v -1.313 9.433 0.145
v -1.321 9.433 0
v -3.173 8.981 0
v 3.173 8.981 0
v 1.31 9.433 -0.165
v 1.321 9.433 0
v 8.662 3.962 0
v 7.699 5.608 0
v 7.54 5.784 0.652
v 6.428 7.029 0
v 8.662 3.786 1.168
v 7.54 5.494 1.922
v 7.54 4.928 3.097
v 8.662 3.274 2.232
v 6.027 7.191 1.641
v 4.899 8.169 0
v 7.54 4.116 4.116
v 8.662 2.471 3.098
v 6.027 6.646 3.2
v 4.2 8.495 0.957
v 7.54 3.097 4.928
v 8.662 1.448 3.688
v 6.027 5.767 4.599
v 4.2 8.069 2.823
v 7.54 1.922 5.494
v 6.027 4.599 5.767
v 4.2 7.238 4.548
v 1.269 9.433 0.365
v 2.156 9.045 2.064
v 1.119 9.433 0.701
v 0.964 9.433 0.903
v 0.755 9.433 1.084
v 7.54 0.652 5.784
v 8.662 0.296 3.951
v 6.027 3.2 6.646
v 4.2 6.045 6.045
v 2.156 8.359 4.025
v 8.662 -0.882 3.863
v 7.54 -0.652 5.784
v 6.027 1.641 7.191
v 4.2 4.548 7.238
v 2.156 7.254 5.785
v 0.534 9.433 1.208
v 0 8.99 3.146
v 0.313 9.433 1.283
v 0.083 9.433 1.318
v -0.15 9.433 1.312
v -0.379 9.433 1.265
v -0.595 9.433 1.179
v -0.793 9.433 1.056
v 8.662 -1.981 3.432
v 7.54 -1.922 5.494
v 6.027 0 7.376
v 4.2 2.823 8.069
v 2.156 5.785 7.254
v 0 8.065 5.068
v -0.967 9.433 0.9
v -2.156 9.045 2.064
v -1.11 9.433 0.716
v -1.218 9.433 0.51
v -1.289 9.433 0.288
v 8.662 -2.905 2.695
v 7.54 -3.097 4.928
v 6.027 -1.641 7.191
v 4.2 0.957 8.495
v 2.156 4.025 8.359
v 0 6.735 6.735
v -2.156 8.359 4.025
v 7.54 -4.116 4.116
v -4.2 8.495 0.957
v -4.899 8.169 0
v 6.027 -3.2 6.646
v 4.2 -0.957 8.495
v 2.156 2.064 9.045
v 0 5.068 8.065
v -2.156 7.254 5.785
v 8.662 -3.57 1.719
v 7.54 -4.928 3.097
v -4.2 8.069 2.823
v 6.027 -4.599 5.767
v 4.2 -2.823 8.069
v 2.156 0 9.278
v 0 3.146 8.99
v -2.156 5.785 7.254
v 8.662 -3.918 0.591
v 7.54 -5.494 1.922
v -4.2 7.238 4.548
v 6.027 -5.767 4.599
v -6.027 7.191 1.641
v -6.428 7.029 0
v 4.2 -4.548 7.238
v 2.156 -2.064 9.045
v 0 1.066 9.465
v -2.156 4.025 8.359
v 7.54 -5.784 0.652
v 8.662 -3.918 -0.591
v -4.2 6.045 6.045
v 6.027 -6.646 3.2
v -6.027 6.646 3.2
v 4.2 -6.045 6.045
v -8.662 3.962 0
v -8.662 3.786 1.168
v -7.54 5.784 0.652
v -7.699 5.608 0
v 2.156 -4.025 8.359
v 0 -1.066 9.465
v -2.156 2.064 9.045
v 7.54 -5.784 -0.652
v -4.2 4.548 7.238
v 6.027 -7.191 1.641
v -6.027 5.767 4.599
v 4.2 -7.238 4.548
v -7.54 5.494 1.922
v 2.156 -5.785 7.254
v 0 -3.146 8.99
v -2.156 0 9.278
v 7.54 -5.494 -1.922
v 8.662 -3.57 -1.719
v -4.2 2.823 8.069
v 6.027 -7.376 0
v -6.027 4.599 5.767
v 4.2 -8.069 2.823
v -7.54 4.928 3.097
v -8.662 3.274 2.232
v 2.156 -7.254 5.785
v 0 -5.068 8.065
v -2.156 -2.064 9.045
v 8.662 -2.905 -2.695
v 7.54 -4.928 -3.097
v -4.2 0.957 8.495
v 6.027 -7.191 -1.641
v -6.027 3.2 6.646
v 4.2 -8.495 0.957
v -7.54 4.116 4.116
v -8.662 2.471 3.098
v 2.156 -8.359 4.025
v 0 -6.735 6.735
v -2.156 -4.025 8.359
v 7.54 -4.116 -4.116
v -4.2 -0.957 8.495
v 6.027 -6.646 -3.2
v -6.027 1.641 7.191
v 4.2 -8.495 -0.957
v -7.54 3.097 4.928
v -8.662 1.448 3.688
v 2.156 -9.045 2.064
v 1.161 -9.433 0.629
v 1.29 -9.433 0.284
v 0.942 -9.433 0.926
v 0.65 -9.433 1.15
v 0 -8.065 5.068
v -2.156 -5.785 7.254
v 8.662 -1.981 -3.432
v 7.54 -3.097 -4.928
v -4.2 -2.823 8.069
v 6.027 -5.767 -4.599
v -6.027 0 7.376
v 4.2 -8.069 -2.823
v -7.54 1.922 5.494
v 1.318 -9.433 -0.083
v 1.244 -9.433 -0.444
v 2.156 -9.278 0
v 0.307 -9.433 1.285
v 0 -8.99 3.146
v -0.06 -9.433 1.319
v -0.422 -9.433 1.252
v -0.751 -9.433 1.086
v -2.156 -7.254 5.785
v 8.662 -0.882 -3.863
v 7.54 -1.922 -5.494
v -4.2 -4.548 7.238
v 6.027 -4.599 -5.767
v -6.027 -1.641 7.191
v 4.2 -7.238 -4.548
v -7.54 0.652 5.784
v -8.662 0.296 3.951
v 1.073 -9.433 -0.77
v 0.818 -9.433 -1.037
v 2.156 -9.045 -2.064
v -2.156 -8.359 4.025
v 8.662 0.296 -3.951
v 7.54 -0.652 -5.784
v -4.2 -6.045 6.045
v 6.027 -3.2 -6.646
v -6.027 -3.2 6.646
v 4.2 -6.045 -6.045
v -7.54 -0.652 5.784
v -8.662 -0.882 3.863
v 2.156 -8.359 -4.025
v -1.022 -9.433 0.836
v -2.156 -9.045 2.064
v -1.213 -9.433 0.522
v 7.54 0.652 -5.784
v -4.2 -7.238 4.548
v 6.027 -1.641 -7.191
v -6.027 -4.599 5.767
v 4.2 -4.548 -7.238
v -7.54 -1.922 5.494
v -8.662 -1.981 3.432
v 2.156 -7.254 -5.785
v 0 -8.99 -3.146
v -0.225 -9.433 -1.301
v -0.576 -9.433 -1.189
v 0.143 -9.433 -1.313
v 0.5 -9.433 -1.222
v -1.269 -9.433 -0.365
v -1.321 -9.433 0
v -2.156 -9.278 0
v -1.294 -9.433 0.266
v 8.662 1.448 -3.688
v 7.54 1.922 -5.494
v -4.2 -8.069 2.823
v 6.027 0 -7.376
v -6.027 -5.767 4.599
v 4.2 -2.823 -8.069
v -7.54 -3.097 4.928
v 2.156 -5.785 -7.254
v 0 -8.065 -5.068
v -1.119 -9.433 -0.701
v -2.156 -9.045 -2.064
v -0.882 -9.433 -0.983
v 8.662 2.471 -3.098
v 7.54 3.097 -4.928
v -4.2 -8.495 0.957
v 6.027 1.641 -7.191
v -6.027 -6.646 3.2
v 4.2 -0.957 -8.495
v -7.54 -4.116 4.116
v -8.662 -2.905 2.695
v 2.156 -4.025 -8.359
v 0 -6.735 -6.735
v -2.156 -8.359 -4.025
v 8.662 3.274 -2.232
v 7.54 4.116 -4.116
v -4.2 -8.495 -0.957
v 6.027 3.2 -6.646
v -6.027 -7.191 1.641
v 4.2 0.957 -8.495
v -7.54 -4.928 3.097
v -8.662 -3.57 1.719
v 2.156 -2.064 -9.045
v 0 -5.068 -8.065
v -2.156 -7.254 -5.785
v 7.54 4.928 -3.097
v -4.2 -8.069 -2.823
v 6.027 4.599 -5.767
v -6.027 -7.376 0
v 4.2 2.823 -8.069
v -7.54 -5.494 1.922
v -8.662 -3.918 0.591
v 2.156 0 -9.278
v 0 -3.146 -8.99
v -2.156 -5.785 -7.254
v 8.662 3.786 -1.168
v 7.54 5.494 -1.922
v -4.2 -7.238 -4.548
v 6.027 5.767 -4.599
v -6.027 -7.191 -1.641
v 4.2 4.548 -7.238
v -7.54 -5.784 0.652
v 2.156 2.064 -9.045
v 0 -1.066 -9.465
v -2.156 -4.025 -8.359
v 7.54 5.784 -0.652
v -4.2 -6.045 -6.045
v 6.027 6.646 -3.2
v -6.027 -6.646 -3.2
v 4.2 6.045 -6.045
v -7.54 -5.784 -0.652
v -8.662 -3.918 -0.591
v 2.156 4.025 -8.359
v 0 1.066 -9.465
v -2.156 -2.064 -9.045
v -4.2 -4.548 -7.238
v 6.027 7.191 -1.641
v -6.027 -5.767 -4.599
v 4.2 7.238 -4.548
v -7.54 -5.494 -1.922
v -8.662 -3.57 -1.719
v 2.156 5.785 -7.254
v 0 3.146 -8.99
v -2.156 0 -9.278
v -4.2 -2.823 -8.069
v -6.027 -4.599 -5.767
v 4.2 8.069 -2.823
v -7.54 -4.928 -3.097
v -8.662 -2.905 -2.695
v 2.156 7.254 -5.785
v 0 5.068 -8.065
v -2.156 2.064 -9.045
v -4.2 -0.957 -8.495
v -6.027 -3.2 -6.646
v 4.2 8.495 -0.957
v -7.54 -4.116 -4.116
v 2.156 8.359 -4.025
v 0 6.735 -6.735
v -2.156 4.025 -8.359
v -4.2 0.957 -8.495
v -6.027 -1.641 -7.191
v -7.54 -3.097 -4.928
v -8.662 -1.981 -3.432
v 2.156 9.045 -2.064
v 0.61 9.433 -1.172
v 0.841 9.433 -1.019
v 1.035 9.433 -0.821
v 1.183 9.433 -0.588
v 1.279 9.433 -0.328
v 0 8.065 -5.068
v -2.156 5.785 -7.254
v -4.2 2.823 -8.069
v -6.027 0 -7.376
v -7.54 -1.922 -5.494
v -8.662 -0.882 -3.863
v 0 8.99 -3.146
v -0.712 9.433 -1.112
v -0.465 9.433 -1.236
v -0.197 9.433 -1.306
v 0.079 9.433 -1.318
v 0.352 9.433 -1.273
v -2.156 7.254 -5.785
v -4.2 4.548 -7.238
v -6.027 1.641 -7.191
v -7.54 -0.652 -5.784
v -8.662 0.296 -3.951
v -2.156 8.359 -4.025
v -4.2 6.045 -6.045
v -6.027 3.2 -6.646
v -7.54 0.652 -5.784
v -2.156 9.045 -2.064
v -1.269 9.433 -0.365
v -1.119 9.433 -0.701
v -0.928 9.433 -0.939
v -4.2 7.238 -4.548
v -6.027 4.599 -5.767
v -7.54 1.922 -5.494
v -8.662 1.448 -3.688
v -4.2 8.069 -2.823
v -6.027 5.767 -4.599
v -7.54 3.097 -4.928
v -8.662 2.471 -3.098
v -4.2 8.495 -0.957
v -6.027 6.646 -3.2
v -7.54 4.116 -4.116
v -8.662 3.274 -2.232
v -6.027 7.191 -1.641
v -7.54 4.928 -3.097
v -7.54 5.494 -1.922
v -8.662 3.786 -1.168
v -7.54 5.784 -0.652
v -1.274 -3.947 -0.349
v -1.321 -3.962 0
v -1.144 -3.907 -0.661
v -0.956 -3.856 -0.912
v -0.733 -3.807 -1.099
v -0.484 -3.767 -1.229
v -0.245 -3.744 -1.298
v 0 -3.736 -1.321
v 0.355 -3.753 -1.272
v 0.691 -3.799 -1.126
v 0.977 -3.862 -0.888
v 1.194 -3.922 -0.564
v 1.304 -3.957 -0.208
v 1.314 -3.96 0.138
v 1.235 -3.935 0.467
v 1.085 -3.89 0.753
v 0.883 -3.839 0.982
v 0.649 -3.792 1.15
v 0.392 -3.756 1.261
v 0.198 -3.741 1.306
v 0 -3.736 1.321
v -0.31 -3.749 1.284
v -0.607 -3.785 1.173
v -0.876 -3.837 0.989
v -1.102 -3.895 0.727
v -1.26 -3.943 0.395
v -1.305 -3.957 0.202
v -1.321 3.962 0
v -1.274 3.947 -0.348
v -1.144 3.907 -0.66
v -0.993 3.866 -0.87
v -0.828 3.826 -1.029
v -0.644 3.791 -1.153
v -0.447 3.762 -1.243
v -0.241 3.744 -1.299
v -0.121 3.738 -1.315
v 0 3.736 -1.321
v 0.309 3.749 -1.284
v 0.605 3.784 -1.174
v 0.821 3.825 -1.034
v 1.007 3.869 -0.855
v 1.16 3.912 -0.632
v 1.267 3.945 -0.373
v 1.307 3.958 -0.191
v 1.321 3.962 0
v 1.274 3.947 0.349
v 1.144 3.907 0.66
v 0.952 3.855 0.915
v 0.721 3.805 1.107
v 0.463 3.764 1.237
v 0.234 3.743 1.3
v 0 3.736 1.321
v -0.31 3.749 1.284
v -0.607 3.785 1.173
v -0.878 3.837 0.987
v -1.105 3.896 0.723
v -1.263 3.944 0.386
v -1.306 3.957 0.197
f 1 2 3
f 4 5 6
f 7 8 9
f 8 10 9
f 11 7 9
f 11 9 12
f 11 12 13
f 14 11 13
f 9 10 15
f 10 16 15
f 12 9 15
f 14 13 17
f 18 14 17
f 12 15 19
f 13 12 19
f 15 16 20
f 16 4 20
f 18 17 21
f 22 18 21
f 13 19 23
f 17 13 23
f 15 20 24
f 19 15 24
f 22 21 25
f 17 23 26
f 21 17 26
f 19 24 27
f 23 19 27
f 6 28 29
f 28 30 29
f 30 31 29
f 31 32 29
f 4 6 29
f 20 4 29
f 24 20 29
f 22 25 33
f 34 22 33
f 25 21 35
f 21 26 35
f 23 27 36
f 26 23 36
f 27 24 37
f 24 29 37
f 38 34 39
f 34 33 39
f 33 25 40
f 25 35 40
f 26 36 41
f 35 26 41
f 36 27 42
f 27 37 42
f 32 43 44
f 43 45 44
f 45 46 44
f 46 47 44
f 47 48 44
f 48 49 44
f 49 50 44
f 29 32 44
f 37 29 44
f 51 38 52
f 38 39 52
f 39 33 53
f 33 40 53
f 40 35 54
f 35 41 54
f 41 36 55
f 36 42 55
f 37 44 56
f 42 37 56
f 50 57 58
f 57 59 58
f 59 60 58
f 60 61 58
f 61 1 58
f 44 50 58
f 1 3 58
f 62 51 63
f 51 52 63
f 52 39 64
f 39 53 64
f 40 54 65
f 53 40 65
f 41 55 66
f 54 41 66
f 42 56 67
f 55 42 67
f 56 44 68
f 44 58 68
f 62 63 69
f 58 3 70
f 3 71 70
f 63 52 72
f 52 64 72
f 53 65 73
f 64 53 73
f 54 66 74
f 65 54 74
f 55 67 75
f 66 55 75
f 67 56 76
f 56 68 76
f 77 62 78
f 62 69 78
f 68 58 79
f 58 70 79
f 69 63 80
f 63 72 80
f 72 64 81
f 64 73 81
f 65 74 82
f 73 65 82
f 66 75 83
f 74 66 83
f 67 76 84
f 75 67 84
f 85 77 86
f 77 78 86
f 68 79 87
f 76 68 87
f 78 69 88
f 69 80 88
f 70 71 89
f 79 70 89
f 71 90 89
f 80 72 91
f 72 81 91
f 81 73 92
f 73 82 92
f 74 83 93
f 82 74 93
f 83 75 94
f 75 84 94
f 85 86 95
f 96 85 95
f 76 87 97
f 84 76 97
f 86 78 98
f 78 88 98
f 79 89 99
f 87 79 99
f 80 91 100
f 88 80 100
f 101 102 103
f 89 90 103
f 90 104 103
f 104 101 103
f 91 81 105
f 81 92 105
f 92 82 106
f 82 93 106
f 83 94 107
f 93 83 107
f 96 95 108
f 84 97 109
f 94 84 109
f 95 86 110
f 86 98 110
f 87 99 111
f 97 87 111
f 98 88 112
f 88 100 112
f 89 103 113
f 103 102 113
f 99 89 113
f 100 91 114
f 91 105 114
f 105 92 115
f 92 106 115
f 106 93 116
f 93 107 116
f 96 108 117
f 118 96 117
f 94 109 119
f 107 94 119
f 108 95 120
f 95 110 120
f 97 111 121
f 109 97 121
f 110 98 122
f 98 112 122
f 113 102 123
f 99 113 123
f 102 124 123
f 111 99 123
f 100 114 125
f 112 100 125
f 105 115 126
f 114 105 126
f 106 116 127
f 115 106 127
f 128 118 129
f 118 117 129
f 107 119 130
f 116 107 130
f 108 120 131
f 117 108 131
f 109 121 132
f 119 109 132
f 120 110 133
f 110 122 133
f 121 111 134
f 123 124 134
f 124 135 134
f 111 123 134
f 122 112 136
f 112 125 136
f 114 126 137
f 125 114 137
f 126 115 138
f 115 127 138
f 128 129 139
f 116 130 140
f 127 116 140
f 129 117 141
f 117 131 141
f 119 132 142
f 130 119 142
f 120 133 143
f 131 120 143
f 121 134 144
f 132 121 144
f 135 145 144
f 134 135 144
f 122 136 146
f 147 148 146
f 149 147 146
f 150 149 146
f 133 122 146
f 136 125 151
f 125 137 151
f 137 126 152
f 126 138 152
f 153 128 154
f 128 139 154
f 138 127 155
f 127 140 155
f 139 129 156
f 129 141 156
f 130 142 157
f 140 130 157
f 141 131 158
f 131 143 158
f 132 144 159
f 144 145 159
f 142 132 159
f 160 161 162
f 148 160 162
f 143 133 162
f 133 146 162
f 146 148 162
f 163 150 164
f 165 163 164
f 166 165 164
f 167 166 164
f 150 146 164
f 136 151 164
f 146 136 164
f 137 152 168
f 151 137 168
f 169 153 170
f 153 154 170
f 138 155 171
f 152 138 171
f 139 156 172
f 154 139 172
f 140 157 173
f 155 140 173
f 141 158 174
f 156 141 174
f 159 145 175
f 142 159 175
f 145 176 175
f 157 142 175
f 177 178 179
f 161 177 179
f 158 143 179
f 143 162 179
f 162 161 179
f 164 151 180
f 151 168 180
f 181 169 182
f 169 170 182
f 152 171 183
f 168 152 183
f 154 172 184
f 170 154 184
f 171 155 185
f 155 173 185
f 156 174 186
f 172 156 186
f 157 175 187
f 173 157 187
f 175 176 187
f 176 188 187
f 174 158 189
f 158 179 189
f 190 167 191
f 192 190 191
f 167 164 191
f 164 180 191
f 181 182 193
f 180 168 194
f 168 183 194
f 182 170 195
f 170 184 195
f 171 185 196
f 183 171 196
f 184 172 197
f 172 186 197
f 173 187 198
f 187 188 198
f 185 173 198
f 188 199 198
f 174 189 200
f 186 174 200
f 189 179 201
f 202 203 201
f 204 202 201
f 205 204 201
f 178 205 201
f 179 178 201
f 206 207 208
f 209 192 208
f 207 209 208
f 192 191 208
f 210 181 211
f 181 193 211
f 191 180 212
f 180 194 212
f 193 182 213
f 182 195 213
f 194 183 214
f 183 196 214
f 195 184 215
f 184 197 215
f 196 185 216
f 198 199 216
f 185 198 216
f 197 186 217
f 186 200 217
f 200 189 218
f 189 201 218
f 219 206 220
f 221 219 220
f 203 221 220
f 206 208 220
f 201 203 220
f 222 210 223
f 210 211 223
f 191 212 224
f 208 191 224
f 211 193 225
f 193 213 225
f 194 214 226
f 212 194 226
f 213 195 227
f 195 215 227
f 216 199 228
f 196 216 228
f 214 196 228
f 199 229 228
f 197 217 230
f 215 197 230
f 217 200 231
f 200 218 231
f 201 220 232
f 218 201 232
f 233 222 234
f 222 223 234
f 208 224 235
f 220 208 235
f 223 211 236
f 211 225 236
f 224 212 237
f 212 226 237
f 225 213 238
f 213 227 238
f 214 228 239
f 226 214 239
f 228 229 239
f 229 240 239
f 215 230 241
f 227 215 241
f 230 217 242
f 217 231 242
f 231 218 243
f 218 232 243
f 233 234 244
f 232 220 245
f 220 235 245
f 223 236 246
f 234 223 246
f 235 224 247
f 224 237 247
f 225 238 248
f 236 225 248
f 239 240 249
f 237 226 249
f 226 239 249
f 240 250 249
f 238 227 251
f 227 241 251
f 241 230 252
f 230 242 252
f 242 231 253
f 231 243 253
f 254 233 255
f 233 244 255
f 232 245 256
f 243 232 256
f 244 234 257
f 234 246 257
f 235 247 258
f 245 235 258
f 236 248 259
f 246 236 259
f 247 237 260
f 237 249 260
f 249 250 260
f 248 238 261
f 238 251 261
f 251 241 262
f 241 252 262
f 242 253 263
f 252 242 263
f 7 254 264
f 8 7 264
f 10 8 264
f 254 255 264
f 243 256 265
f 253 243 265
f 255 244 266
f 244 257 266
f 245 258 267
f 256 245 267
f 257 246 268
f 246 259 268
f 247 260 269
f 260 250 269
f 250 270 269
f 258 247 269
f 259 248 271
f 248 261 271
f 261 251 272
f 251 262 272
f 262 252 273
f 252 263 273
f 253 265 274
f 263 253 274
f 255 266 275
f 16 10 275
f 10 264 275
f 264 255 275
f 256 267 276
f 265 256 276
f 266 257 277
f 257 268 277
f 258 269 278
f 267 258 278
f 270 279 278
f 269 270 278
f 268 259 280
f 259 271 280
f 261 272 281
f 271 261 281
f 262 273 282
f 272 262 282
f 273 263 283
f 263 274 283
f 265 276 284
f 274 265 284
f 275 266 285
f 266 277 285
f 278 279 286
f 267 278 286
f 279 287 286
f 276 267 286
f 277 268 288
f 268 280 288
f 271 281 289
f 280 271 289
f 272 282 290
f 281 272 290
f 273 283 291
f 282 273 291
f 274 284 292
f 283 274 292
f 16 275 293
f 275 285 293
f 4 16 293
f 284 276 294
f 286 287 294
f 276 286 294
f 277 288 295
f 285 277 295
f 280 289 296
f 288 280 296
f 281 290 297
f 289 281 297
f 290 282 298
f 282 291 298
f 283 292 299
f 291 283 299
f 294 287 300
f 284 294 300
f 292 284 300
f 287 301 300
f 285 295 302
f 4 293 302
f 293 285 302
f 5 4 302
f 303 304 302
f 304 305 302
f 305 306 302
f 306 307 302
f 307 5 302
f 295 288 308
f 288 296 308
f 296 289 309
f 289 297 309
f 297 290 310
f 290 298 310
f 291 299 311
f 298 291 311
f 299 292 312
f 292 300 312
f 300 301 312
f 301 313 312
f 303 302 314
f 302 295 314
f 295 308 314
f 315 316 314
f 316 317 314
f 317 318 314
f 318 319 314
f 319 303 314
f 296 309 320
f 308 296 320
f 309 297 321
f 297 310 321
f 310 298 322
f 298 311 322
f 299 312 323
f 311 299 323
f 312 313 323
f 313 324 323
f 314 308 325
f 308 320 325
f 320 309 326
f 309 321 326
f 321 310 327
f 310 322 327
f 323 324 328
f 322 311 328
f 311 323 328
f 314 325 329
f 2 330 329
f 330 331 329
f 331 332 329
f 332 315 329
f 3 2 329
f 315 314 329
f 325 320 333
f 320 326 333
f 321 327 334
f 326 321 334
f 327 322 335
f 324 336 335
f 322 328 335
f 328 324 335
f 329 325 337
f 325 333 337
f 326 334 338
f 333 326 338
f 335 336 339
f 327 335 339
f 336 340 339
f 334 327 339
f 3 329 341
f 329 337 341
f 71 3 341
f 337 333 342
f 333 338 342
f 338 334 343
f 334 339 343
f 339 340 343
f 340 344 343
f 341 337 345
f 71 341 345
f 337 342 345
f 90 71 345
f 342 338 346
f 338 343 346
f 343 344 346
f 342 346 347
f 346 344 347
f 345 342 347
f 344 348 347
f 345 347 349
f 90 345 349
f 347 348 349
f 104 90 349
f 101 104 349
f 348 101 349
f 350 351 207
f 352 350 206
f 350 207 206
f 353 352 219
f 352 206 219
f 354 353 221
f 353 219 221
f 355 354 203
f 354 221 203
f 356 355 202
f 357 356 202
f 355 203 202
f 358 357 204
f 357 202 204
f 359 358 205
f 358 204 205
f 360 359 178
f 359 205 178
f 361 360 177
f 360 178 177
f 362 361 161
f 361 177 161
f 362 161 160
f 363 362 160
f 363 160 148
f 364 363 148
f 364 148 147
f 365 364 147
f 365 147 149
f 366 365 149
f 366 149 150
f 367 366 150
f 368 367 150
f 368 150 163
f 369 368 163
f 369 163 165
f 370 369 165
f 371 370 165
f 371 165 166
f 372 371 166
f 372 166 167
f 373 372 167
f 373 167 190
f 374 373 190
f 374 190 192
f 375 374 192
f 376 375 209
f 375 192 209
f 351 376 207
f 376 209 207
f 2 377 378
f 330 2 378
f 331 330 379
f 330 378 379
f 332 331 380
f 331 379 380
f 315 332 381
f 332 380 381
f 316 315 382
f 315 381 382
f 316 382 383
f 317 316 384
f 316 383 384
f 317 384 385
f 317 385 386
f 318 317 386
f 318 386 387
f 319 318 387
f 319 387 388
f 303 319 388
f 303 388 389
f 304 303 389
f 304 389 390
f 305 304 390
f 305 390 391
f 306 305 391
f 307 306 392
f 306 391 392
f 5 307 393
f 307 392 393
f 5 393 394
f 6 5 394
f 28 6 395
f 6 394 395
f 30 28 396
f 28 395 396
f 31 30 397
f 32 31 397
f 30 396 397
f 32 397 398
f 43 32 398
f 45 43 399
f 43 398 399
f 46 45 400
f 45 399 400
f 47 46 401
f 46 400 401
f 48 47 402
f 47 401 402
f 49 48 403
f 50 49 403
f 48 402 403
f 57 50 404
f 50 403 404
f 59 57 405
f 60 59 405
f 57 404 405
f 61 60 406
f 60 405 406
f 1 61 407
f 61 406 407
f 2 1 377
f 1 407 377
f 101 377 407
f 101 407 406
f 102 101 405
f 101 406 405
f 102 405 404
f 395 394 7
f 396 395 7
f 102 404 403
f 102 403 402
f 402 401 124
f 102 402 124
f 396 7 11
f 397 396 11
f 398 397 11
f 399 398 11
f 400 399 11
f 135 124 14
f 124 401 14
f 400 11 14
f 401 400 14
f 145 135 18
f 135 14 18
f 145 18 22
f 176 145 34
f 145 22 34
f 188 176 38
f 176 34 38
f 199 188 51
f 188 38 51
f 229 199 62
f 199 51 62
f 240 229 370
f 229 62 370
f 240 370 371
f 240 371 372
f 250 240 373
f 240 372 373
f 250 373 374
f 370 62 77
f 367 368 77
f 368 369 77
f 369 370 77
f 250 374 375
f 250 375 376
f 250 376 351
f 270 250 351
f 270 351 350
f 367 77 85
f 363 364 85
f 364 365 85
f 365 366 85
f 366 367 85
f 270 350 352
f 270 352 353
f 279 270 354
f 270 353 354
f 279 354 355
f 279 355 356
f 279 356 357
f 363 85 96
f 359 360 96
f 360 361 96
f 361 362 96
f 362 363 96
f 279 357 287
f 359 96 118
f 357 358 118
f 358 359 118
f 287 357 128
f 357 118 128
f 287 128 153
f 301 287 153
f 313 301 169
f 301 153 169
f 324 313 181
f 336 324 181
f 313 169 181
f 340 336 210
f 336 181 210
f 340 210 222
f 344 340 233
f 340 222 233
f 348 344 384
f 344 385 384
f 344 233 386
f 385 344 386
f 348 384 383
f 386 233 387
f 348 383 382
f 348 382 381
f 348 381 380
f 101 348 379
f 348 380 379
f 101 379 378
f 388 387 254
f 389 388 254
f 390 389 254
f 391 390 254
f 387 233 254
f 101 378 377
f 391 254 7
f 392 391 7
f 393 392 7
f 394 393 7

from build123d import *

# Parameters (mm, degrees)
CUT_EXTRUDE1_REACH             = 18.498
SKETCH2_R                      = 3.9624
CUT_EXTRUDE1_DIRECTION_2_REACH = 18.498
F_37_0_104_DIAMETER_HOLE1_D    = 2.6416


with BuildPart() as part:
    # Sketch1 → Revolve1 (revolve)
    with BuildSketch(Plane.XY):
        with BuildLine():
            Line((-9.525, 0), (9.525, 0))
            ThreePointArc((9.525, 0), (0, 9.525), (-9.525, 0))
        make_face()
    revolve(axis=Axis((-12.682244361, 0, 0), (1, 0, 0)))

    # Sketch2 → Cut-Extrude1 (cut, up to next)
    with BuildSketch(Plane(origin=(0, 0, 0), x_dir=(0, 0, -1), z_dir=(1, 0, 0)), mode=Mode.PRIVATE) as cut_extrude1_sk1:
        with Locations(Location((0, 0, 0), (0, 0, 90))):
            Circle(SKETCH2_R)
    cut_extrude1_tool1 = extrude(cut_extrude1_sk1.sketch, amount=-CUT_EXTRUDE1_REACH, mode=Mode.PRIVATE) & part.part
    add(cut_extrude1_tool1.solids().sort_by_distance((0, 0, 0))[0], mode=Mode.SUBTRACT)

    # Sketch2 → Cut-Extrude1 direction 2 (cut, up to next)
    with BuildSketch(Plane(origin=(0, 0, 0), x_dir=(0, 0, -1), z_dir=(1, 0, 0)), mode=Mode.PRIVATE) as cut_extrude1_direction_2_sk1:
        with Locations(Location((0, 0, 0), (0, 0, 90))):
            Circle(SKETCH2_R)
    cut_extrude1_direction_2_tool1 = extrude(cut_extrude1_direction_2_sk1.sketch, amount=CUT_EXTRUDE1_DIRECTION_2_REACH, mode=Mode.PRIVATE) & part.part
    add(cut_extrude1_direction_2_tool1.solids().sort_by_distance((0, 0, 0))[0], mode=Mode.SUBTRACT)

    # #37 (0.104) Diameter Hole1 (through all)
    with Locations(Plane(origin=(0, 9.525, 0), x_dir=(1, 0, 0), z_dir=(0, 1, 0))):
        with Locations((0, 0)):
            Hole(F_37_0_104_DIAMETER_HOLE1_D / 2)


solid = part.part
